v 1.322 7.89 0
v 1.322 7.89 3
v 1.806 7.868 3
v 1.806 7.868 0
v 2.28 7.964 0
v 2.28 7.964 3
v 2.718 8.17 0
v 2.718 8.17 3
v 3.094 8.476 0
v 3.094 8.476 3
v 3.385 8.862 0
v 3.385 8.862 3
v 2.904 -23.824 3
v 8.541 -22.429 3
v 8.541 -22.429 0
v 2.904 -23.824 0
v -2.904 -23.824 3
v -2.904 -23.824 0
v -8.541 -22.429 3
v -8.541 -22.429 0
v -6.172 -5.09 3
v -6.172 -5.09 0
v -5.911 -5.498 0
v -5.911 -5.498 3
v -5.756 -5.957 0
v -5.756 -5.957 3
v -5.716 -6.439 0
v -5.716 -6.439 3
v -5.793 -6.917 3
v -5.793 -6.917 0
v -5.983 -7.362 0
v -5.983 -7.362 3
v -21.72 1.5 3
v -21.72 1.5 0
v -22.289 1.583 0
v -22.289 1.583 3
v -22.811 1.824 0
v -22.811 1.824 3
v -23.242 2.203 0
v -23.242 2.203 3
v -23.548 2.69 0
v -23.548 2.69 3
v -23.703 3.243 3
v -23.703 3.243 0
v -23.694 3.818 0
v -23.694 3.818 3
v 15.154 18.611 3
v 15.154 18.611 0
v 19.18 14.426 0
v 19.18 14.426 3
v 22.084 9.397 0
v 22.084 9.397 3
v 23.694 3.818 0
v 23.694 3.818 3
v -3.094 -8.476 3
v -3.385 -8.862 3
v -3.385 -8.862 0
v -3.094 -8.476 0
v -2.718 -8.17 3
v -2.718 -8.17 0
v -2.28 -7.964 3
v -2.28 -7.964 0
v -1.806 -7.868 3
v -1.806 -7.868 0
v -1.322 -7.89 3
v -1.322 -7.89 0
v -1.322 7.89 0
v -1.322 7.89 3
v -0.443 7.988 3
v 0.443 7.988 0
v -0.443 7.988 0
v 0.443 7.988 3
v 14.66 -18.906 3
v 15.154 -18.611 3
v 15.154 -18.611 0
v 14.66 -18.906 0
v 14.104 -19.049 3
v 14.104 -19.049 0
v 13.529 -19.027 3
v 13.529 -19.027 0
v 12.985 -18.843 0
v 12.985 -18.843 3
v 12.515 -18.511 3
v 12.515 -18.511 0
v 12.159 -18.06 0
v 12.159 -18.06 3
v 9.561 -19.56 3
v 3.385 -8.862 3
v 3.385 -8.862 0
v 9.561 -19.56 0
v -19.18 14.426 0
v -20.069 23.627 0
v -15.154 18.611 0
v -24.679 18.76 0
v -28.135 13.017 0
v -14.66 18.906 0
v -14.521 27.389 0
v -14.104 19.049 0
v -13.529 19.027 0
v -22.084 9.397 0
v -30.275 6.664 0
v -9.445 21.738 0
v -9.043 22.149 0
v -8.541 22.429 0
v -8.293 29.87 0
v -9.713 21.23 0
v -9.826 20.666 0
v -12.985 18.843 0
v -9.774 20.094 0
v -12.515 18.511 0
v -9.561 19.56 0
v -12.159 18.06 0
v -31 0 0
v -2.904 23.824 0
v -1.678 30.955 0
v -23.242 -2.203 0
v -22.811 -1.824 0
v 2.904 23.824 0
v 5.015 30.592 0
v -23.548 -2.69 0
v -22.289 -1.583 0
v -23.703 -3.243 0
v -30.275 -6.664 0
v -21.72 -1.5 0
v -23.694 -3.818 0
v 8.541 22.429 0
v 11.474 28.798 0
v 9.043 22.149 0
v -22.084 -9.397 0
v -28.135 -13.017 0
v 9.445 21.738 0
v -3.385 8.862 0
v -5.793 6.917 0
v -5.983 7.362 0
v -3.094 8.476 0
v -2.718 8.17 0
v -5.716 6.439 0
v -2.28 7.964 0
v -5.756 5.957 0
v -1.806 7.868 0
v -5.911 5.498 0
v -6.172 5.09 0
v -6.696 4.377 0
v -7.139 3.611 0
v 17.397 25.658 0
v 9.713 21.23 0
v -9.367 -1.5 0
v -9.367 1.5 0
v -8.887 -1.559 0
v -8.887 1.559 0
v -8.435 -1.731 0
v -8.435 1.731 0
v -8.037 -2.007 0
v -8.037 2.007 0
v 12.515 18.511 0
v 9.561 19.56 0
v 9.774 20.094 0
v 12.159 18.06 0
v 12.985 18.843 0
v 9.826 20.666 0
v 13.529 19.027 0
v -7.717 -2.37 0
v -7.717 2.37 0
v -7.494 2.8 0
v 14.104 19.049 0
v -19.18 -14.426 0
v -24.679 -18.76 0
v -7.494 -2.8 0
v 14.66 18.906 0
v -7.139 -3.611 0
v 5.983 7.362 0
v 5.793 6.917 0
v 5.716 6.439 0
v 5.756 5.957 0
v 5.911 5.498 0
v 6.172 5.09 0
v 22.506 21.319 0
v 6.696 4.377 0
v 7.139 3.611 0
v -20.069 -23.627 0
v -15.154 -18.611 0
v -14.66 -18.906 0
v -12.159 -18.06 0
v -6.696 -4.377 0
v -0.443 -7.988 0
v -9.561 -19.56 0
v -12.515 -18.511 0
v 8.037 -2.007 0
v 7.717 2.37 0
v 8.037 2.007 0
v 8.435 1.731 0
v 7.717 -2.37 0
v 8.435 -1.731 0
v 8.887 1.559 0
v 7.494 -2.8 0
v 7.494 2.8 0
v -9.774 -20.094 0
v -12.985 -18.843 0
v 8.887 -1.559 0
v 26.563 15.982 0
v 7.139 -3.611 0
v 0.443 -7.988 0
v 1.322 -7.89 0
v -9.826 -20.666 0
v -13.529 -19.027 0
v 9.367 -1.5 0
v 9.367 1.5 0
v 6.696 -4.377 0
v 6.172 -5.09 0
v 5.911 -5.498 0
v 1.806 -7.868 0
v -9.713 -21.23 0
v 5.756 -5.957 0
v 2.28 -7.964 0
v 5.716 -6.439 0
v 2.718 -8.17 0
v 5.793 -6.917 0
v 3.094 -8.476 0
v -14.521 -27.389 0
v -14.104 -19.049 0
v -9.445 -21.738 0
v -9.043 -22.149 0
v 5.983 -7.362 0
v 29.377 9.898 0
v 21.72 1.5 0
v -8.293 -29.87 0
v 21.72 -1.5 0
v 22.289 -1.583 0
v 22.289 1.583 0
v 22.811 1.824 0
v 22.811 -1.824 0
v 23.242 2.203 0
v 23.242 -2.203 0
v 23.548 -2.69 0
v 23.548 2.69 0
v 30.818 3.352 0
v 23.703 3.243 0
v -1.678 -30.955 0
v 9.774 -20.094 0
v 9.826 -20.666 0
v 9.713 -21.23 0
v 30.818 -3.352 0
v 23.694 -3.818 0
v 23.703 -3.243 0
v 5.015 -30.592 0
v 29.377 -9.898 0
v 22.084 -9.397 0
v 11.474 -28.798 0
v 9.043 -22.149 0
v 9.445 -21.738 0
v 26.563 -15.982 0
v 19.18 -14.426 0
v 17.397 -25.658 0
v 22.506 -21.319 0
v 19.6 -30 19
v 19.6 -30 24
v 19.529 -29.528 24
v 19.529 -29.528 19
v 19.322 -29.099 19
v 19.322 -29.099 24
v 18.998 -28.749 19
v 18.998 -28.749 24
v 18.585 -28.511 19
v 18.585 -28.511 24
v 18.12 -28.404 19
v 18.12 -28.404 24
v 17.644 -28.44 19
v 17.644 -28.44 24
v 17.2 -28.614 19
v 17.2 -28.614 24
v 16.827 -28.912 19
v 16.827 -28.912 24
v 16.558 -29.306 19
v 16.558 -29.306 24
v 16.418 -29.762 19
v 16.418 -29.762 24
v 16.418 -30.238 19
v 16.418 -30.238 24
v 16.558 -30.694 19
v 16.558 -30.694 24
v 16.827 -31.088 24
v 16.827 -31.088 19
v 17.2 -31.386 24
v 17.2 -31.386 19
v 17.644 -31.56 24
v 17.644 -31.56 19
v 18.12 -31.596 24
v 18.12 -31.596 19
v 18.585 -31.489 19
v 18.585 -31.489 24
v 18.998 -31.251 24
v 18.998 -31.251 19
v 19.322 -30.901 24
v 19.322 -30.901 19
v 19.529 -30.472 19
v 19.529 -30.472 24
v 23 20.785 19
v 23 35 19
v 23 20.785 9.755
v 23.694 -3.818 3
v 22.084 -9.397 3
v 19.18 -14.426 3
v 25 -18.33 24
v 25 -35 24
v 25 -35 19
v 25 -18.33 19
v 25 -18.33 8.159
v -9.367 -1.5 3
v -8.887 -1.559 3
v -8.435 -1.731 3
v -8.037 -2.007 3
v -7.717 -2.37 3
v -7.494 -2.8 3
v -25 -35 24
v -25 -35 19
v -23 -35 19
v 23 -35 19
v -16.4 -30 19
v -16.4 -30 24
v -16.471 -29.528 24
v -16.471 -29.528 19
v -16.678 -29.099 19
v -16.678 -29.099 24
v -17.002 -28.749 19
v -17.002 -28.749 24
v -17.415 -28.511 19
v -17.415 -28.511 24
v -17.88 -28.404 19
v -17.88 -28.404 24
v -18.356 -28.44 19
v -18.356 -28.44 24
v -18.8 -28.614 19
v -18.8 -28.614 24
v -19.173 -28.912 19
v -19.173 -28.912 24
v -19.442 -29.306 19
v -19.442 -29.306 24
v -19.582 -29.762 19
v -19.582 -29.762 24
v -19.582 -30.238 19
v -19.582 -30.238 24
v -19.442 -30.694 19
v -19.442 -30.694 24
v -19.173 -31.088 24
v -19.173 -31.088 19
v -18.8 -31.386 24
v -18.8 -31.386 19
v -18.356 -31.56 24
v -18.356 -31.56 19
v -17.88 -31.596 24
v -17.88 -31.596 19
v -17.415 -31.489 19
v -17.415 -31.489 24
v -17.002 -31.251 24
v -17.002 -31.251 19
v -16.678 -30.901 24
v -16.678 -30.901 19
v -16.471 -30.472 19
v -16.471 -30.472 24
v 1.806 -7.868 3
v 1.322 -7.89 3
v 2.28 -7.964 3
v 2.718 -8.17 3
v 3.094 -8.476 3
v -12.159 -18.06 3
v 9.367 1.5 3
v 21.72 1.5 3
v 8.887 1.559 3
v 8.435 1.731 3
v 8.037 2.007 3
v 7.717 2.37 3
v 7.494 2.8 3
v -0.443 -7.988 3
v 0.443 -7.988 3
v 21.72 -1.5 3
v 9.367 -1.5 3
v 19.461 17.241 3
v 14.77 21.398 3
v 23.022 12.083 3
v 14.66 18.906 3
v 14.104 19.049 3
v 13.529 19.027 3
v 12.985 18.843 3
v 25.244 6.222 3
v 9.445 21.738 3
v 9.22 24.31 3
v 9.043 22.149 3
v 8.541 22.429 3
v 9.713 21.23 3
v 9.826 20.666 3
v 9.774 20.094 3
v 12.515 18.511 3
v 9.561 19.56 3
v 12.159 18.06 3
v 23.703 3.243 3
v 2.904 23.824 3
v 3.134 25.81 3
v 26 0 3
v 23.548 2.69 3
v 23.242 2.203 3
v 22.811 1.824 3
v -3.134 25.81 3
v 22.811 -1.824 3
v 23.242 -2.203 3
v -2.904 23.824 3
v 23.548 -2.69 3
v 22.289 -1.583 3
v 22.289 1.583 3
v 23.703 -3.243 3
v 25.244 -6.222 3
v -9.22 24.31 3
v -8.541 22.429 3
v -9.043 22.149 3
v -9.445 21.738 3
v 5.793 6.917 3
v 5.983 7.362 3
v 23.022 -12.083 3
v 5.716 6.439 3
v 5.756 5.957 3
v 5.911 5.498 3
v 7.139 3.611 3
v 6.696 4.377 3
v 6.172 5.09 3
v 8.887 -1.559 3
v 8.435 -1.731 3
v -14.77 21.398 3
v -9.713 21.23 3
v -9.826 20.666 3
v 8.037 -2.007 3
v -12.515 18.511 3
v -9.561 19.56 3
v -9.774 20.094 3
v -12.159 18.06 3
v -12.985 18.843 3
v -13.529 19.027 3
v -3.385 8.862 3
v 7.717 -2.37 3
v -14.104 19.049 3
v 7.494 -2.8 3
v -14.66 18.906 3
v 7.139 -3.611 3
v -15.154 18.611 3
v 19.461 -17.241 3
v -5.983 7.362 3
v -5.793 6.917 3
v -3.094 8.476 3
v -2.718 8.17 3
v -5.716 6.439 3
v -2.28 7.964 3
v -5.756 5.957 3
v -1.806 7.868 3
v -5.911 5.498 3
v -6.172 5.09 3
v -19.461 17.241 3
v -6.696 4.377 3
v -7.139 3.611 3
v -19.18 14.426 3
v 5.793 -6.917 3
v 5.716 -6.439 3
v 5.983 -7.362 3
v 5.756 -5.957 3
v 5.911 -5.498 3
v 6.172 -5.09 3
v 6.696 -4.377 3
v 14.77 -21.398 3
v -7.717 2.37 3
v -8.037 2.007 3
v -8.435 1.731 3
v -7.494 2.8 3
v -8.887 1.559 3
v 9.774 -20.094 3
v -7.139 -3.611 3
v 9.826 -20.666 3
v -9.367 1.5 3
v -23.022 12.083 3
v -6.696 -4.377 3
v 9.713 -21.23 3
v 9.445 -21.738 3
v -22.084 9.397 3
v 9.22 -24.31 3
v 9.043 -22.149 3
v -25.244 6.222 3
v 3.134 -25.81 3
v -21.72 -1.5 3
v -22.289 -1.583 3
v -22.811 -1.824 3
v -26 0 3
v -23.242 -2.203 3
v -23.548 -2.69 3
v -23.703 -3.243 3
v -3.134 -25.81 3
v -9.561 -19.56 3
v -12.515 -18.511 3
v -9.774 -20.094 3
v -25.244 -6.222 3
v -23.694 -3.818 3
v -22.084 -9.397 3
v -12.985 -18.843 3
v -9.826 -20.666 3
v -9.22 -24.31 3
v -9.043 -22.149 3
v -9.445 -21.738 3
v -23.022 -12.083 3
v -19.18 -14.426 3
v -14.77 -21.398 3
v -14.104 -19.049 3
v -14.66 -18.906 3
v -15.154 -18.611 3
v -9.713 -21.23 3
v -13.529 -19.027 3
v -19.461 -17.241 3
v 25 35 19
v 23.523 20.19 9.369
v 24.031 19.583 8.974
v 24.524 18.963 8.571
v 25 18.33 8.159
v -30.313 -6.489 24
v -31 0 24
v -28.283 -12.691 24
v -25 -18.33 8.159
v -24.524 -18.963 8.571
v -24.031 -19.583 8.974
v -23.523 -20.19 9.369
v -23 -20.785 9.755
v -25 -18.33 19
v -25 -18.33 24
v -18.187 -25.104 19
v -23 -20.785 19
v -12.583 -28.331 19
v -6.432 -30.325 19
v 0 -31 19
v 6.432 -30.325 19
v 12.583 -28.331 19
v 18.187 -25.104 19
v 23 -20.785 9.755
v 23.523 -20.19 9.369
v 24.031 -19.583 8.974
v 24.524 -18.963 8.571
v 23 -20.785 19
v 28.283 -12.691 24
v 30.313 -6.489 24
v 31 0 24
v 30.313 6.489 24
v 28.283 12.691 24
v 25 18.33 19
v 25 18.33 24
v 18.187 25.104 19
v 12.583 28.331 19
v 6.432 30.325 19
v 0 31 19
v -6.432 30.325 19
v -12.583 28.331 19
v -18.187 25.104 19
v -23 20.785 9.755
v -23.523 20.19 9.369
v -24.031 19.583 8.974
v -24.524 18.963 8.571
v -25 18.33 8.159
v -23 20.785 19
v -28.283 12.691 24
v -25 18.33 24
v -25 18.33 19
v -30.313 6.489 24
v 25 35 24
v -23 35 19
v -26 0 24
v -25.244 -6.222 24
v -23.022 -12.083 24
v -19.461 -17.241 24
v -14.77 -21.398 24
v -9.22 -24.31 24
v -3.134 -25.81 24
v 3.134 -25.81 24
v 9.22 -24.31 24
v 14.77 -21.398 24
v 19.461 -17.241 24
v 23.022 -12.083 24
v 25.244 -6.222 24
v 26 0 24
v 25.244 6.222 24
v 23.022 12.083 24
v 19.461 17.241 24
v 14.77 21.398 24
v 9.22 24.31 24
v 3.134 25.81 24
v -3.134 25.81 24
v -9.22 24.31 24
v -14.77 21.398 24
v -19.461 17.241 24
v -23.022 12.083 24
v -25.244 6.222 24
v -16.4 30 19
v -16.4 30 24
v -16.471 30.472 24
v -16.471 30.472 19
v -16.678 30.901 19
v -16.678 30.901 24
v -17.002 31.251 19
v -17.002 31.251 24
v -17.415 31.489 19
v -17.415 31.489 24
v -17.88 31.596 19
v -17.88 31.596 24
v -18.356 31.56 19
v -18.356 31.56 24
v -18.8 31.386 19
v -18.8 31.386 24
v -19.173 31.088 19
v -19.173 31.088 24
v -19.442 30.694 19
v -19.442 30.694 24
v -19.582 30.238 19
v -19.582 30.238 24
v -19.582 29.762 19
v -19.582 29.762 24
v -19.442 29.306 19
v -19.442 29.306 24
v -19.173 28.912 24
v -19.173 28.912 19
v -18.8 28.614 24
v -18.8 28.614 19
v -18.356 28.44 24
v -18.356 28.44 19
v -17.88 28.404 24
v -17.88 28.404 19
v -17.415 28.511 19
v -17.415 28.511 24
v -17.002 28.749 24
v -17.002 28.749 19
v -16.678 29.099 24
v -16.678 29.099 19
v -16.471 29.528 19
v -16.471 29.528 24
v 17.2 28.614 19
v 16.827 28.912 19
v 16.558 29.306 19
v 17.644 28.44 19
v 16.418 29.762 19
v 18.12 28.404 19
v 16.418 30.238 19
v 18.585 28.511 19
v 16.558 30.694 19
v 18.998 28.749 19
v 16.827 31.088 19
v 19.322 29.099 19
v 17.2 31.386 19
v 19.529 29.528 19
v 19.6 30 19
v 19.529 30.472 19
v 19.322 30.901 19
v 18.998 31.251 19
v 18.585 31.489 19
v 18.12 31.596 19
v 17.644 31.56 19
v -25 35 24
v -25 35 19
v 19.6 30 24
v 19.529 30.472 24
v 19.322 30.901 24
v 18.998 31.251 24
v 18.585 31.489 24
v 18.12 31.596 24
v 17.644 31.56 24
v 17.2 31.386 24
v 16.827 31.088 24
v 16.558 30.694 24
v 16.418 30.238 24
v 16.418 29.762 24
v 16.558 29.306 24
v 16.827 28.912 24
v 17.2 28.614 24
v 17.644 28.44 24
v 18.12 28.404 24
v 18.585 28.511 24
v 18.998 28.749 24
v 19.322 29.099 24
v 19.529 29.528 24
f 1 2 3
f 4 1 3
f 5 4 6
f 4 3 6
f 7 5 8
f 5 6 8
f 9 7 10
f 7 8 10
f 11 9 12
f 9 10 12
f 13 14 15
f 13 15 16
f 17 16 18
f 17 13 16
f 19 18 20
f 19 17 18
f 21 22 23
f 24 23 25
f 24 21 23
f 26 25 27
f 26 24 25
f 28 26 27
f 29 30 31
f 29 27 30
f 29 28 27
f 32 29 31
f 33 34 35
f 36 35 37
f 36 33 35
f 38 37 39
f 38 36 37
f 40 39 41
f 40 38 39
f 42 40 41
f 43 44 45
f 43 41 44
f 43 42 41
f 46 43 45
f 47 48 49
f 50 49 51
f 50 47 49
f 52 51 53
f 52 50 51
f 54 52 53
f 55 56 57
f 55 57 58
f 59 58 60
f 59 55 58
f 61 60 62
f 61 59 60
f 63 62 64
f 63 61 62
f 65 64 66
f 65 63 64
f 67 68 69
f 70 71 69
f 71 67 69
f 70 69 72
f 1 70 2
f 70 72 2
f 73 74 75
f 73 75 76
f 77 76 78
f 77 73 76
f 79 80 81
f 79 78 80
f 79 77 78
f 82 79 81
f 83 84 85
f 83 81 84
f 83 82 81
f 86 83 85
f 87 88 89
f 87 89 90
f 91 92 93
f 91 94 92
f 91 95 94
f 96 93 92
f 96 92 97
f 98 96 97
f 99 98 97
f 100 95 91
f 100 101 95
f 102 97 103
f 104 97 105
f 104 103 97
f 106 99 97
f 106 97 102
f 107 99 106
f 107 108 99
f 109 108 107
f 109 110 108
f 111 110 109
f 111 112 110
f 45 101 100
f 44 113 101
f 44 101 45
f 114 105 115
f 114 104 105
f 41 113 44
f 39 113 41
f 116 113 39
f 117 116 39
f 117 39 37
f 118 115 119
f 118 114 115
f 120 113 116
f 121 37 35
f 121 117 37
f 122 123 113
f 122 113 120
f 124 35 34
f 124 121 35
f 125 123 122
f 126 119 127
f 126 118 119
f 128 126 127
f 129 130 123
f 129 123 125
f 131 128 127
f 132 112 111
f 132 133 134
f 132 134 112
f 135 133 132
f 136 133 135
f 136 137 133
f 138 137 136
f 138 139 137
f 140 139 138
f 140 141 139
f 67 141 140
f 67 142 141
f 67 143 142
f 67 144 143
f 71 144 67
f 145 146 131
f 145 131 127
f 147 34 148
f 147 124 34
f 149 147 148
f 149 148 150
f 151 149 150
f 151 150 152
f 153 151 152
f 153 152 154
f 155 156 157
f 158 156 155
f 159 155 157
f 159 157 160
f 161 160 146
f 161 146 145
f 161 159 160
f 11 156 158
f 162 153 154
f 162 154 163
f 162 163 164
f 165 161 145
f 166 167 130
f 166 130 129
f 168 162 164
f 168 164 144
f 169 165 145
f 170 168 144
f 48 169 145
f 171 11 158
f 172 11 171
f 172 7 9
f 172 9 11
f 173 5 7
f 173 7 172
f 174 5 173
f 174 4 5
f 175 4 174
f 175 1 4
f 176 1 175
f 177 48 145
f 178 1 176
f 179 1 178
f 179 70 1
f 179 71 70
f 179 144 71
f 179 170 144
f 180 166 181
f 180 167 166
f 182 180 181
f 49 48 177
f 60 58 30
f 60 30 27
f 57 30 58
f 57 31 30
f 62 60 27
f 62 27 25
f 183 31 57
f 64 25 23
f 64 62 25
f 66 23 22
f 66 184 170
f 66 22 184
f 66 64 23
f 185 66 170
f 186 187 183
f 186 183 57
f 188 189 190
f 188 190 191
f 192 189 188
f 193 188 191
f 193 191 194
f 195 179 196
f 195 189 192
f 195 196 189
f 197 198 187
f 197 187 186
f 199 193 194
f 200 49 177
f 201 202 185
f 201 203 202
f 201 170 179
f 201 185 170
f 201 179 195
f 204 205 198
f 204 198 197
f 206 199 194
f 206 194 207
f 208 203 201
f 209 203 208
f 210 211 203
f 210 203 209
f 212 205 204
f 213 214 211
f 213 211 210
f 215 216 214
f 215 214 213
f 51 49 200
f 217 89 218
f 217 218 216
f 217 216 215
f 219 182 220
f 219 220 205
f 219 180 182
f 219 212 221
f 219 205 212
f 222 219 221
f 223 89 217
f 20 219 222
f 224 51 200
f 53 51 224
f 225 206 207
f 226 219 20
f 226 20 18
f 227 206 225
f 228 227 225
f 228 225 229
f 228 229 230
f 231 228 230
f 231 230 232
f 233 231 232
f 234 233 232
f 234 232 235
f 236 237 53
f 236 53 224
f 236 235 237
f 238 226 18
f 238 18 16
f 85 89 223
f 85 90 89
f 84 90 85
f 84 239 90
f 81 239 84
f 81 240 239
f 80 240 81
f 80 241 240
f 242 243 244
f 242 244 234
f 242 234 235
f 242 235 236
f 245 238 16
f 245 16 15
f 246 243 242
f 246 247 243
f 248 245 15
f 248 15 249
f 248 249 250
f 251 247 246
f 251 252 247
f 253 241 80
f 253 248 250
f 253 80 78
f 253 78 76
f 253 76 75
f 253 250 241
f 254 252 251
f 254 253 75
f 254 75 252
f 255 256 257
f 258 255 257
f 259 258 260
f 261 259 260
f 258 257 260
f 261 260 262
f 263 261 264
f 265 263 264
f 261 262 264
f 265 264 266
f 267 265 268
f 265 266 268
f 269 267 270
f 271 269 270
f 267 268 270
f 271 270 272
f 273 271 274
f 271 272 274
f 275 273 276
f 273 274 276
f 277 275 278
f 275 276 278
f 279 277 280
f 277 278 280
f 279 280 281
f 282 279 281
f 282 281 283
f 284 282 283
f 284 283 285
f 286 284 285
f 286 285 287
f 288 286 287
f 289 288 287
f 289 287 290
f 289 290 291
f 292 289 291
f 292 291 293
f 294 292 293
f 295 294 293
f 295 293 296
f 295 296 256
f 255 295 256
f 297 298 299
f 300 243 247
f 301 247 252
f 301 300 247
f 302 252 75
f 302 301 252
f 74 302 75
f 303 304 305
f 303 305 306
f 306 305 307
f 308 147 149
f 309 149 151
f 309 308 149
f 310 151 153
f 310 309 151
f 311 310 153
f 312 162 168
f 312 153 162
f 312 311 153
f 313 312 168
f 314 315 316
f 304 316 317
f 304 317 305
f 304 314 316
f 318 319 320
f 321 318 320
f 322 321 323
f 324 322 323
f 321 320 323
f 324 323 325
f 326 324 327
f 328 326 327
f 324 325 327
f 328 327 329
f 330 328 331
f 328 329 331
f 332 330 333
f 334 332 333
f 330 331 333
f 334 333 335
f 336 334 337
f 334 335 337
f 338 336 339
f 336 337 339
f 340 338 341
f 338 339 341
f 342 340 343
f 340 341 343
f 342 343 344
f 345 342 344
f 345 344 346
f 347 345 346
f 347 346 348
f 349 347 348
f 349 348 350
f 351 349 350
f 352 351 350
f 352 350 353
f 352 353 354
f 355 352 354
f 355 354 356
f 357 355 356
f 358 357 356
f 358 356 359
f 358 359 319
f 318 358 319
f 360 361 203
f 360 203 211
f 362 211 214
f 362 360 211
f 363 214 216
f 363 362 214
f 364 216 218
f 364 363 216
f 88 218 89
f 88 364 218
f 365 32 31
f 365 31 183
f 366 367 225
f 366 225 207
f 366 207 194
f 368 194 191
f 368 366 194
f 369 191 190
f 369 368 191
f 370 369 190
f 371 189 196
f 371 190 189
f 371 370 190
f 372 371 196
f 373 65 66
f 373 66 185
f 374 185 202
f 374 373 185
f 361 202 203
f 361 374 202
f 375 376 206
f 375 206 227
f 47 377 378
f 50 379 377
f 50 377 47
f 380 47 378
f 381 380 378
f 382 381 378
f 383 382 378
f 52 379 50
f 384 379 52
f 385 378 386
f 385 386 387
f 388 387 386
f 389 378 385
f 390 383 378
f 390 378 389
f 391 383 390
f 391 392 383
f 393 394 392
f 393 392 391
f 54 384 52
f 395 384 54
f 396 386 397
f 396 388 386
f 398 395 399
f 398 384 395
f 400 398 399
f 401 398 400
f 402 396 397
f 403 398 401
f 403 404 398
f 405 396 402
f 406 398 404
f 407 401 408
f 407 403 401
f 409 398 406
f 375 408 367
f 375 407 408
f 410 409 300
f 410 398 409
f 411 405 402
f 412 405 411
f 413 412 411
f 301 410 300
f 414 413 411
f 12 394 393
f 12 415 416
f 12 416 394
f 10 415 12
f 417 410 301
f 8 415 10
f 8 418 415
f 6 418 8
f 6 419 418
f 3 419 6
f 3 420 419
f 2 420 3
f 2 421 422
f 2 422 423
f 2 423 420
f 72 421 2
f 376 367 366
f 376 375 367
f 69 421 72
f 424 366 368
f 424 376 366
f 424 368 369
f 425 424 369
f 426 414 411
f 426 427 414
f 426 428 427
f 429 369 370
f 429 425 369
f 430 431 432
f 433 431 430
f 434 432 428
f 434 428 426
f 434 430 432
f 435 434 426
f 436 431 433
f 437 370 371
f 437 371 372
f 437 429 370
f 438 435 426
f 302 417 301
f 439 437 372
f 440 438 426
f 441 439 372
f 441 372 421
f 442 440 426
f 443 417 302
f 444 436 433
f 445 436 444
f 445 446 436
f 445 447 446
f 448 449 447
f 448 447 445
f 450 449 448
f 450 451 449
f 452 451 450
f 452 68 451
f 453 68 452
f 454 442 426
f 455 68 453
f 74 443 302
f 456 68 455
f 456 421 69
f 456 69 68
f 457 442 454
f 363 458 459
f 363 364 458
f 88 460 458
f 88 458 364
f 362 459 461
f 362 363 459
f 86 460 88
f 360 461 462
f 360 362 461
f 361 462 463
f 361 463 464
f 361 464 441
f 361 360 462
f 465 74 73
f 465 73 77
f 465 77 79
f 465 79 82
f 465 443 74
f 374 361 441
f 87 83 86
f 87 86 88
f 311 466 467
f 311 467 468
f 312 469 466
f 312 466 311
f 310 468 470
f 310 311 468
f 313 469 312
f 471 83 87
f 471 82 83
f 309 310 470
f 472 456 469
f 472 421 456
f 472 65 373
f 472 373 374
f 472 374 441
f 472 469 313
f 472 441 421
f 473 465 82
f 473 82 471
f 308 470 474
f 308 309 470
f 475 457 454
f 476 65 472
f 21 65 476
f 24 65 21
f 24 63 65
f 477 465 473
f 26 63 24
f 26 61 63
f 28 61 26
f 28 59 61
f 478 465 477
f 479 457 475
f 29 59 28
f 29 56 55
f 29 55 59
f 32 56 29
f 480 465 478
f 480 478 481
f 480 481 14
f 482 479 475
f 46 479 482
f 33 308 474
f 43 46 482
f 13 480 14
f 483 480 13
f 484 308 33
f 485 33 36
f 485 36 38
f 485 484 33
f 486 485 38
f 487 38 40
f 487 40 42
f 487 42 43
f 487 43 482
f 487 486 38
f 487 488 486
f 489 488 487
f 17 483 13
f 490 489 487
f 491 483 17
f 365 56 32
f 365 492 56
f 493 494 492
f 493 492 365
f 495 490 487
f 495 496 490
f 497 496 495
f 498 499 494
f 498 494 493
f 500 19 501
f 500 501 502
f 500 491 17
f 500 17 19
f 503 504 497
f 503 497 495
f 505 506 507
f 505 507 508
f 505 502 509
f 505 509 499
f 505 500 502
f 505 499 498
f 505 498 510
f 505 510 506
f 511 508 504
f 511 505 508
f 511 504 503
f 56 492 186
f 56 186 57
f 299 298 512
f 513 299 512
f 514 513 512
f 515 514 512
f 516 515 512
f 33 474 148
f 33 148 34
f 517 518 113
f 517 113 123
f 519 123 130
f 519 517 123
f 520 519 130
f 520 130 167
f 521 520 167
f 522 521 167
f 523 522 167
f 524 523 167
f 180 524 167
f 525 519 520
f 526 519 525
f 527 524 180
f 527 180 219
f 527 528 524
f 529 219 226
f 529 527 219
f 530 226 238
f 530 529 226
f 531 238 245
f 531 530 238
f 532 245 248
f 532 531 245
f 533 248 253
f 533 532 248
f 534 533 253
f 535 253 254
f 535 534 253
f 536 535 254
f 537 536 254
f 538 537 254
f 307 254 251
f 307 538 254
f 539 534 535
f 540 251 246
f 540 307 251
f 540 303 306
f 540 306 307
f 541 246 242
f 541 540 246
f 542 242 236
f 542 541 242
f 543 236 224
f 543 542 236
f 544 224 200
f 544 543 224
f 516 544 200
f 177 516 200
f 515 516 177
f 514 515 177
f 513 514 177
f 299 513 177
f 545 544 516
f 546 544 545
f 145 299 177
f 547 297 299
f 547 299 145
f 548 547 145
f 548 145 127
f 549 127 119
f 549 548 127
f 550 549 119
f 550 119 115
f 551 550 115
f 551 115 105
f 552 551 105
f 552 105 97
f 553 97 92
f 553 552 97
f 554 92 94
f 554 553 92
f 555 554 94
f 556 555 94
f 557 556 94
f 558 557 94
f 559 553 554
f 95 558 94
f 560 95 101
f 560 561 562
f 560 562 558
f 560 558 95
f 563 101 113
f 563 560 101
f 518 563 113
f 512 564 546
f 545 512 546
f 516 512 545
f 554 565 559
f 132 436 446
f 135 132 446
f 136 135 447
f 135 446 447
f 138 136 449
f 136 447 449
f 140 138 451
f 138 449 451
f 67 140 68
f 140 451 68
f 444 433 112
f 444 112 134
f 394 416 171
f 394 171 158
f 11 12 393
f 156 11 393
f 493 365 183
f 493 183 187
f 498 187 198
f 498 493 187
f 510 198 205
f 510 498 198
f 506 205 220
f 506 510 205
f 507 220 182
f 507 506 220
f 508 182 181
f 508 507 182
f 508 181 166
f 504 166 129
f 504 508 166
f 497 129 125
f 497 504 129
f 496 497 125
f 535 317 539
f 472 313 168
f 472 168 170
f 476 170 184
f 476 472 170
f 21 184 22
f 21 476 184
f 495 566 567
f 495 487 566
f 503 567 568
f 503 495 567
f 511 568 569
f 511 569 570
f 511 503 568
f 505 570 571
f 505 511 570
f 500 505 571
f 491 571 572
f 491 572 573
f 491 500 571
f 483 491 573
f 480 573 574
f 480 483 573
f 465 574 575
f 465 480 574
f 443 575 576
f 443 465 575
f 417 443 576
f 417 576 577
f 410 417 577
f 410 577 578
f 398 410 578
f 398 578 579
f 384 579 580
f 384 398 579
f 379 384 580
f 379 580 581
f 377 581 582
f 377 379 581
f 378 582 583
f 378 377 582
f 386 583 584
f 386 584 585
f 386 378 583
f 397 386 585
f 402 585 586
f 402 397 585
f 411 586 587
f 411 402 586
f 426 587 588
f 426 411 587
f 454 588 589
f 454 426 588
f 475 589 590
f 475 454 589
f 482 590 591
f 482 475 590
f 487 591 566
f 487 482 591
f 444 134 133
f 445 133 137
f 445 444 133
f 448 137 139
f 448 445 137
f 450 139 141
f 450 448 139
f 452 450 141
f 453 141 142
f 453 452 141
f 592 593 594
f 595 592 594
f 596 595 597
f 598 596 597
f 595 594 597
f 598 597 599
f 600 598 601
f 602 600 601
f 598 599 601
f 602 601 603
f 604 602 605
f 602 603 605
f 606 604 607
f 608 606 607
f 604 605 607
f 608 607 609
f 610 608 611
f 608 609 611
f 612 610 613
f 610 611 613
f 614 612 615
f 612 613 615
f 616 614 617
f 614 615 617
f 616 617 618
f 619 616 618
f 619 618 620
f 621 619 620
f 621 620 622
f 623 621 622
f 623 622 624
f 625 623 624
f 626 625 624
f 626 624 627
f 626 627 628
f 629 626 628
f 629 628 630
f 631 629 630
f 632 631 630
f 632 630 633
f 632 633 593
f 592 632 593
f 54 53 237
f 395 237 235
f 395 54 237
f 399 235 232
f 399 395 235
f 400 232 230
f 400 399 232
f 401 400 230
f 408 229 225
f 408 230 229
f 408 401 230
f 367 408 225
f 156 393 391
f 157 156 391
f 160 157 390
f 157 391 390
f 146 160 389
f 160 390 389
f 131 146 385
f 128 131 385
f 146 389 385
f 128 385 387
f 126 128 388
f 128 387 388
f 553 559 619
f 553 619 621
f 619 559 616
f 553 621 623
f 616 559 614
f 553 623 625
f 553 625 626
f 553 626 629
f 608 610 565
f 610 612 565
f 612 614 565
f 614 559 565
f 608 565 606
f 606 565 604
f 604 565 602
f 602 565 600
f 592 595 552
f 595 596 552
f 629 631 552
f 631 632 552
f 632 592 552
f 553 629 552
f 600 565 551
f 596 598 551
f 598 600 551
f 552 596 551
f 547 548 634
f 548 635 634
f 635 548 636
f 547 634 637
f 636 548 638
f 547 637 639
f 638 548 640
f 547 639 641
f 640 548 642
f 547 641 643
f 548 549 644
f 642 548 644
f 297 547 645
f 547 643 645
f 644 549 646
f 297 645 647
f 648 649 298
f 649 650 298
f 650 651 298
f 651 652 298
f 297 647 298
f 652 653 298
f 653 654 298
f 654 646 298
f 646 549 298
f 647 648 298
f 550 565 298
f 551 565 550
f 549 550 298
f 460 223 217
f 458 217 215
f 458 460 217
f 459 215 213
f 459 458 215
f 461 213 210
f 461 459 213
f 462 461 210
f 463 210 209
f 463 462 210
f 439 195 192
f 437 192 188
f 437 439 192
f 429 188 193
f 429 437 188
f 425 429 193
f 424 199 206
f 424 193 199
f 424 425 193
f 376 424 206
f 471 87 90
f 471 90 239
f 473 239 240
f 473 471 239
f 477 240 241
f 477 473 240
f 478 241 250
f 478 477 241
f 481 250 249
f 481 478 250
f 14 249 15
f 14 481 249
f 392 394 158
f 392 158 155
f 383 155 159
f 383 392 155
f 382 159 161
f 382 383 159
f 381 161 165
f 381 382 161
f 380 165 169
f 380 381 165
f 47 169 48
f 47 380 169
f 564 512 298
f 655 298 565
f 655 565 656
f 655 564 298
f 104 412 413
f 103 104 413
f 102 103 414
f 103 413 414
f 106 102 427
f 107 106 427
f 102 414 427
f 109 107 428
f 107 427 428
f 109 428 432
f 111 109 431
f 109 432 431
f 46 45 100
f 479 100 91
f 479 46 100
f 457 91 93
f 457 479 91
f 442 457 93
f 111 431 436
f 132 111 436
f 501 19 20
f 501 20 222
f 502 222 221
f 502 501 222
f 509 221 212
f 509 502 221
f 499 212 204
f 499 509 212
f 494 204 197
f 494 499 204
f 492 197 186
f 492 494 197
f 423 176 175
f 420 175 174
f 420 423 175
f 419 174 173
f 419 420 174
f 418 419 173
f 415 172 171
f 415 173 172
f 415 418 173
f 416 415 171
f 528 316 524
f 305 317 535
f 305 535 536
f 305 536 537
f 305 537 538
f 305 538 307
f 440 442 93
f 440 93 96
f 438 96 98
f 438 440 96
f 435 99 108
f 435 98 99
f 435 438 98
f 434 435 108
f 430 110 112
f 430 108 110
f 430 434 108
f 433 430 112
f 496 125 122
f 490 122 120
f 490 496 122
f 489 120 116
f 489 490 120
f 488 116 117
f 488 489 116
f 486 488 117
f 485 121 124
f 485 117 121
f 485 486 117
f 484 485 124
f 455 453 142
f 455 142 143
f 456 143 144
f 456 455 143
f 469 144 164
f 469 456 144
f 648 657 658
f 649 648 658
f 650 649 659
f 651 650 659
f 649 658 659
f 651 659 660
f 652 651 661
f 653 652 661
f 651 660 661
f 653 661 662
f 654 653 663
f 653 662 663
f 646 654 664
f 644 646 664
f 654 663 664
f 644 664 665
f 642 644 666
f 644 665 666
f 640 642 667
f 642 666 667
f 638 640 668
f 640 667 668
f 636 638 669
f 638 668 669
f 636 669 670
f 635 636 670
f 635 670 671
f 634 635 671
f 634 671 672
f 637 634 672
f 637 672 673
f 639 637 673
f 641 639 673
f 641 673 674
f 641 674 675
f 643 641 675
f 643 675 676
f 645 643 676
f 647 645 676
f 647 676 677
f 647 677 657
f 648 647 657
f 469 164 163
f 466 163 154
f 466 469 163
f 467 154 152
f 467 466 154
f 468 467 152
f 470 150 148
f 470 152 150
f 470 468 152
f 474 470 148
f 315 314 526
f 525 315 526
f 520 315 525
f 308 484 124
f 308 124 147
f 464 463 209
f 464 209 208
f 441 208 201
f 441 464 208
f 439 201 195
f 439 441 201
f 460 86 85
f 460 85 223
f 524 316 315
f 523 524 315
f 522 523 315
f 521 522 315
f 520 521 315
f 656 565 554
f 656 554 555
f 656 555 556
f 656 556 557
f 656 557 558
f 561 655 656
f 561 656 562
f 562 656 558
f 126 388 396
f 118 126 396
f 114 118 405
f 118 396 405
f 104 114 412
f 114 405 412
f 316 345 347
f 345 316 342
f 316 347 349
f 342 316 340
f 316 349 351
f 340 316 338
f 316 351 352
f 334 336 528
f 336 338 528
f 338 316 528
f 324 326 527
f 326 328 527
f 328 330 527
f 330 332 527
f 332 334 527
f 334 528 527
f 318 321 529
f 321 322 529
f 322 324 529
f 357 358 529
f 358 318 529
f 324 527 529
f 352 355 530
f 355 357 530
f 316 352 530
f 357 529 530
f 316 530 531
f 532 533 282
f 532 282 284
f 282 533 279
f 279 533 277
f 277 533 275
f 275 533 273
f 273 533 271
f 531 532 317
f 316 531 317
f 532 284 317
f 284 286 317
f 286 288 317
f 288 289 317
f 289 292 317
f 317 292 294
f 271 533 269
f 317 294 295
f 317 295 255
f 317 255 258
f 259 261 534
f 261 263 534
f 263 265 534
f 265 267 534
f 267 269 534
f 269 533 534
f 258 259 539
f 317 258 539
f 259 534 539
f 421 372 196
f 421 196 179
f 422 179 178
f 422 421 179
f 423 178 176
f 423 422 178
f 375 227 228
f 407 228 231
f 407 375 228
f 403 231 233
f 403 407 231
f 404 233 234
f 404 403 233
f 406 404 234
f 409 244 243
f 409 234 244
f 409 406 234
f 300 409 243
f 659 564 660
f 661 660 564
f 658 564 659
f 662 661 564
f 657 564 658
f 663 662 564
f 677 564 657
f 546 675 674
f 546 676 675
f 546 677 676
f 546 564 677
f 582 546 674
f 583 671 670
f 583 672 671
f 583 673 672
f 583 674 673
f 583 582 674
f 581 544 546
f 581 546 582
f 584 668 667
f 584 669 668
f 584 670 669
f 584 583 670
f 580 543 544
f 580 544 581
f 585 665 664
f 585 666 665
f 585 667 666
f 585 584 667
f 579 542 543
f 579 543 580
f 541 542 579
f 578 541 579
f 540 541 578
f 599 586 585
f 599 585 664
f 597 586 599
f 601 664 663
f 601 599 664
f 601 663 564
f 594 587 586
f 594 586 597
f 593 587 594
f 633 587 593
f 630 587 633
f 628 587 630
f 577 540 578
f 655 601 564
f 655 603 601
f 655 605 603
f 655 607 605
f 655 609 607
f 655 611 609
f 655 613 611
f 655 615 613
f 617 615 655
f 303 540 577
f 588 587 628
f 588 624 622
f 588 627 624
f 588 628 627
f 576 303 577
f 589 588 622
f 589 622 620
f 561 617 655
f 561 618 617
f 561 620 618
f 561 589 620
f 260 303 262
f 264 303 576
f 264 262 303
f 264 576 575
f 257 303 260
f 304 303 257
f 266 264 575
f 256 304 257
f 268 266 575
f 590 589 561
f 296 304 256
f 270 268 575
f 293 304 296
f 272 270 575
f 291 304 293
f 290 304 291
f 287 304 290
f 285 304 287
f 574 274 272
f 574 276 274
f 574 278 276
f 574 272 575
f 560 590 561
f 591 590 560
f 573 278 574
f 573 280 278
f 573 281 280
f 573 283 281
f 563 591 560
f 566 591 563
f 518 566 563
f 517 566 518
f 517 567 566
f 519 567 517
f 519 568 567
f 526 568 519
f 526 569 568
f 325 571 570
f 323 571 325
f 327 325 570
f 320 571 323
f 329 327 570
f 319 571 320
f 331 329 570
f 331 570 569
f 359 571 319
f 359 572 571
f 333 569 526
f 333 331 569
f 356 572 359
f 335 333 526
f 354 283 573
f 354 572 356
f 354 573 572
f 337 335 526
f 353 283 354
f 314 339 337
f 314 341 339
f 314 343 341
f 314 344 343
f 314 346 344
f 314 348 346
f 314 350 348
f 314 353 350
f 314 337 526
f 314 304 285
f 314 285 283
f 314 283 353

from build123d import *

# Parameters (mm, degrees)
BOSS_EXTRUDE1_DEPTH     = 5
RIB4_REACH              = 72.264
SKETCH3_WALL_W          = 162.412301062
SKETCH3_WALL_H          = 2
MIRROR2_COPY_1_REACH    = 72.264
MIRROR2_COPY_1_SKETCH_W = 162.412301062
MIRROR2_COPY_1_SKETCH_H = 2
CUT_EXTRUDE1_DEPTH      = 52.254268115
SKETCH5_R               = 1.6
CUT_EXTRUDE2_DEPTH      = 53.554733374


with BuildPart() as part:
    # Sketch1 → Revolve1 (revolve)
    with BuildSketch(Plane(origin=(0, 0, 0), x_dir=(0, 0, -1), z_dir=(1, 0, 0)), mode=Mode.PRIVATE) as revolve1_sk:
        Polygon((0, 0), (0, 31), (-24, 31), (-24, 26), (-3, 26), (-3, 0), align=None)
    revolve(revolve1_sk.sketch.rotate(Axis((0, 0, 0), (0, 0, 1)), 90), axis=Axis((0, 0, 0), (0, 0, 1)))

    # Sketch2 → Boss-Extrude1 (add)
    with BuildSketch(Plane.XY.offset(24)):
        with BuildLine():
            Line((25, 35), (-25, 35))
            Line((-25, 35), (-25, 18.33030278))
            ThreePointArc((-25, 18.33030278), (0, 31), (25, 18.33030278))
            Line((25, 18.33030278), (25, 35))
        make_face()
        with BuildLine():
            Line((25, -35), (25, -18.33030278))
            ThreePointArc((25, -18.33030278), (0, -31), (-25, -18.33030278))
            Line((-25, -18.33030278), (-25, -35))
            Line((-25, -35), (25, -35))
        make_face()
    extrude(amount=-BOSS_EXTRUDE1_DEPTH)

    # Sketch3 wall → Rib4 (add, up to next)
    with BuildSketch(Plane(origin=(25, 26.66515139, 13.579588783), x_dir=(0, -0.838316763898, -0.54518345845), z_dir=(0, 0.54518345845, -0.838316763898)), mode=Mode.PRIVATE) as rib4_sk1:
        with Locations((0, 1)):
            Rectangle(SKETCH3_WALL_W, SKETCH3_WALL_H)
    rib4_tool1 = extrude(rib4_sk1.sketch, amount=-RIB4_REACH, mode=Mode.PRIVATE) - part.part
    rib4 = rib4_tool1.solids().sort_by_distance((25, 26.66515139, 13.579588783))[0]
    add(rib4)

    # Mirror1: Rib4 across plane
    add(rib4.mirror(Plane.ZX))

    # Mirror2: Rib4 across plane
    add(rib4.mirror(Plane(origin=(0, 0, 0), x_dir=(0, 0, 1), z_dir=(1, 0, 0))))

    # Mirror2 copy 1 sketch → Mirror2 copy 1 (add, up to next)
    with BuildSketch(Plane(origin=(-25, -26.66515139, 13.579588783), x_dir=(0, 0.838316763898, -0.54518345845), z_dir=(0, -0.54518345845, -0.838316763898)), mode=Mode.PRIVATE) as mirror2_copy_1_sk1:
        with Locations((0, 1)):
            Rectangle(MIRROR2_COPY_1_SKETCH_W, MIRROR2_COPY_1_SKETCH_H)
    mirror2_copy_1_tool1 = extrude(mirror2_copy_1_sk1.sketch, amount=-MIRROR2_COPY_1_REACH, mode=Mode.PRIVATE) - part.part
    add(mirror2_copy_1_tool1.solids().sort_by_distance((-25, -26.66515139, 13.579588783))[0])

    # Sketch4 → Cut-Extrude1 (cut, through all)
    with BuildSketch(Plane.XY.offset(3)):
        with BuildLine():
            Line((-9.560865209, 19.559904306), (-3.384710393, 8.86249037))
            ThreePointArc((-3.384710393, 8.86249037), (-2.50559682, 8.053485651), (-1.322127668, 7.889992296))
            ThreePointArc((-1.322127668, 7.889992296), (0, 8), (1.322127668, 7.889992296))
            ThreePointArc((1.322127668, 7.889992296), (2.50559682, 8.053485651), (3.384710393, 8.86249037))
            Line((3.384710393, 8.86249037), (9.560865209, 19.559904306))
            ThreePointArc((9.560865209, 19.559904306), (9.713197693, 21.230053251), (8.540524801, 22.428986516))
            ThreePointArc((8.540524801, 22.428986516), (0, 24), (-8.540524801, 22.428986516))
            ThreePointArc((-8.540524801, 22.428986516), (-9.713197693, 21.230053251), (-9.560865209, 19.559904306))
        make_face()
        with BuildLine():
            Line((21.719806629, 1.5), (9.367496998, 1.5))
            ThreePointArc((9.367496998, 1.5), (8.227321572, 1.856832327), (7.493997598, 2.8))
            ThreePointArc((7.493997598, 2.8), (6.92820323, 4), (6.17186993, 5.089992296))
            ThreePointArc((6.17186993, 5.089992296), (5.721724752, 6.196653323), (5.982786604, 7.36249037))
            Line((5.982786604, 7.36249037), (12.15894142, 18.059904306))
            ThreePointArc((12.15894142, 18.059904306), (13.529166592, 19.02690258), (15.153809703, 18.610804697))
            ThreePointArc((15.153809703, 18.610804697), (20.784609691, 12), (23.694334504, 3.818181818))
            ThreePointArc((23.694334504, 3.818181818), (23.242364286, 2.203150671), (21.719806629, 1.5))
        make_face()
        with BuildLine():
            Line((12.15894142, -18.059904306), (5.982786604, -7.36249037))
            ThreePointArc((5.982786604, -7.36249037), (5.721724752, -6.196653323), (6.17186993, -5.089992296))
            ThreePointArc((6.17186993, -5.089992296), (6.92820323, -4), (7.493997598, -2.8))
            ThreePointArc((7.493997598, -2.8), (8.227321572, -1.856832327), (9.367496998, -1.5))
            Line((9.367496998, -1.5), (21.719806629, -1.5))
            ThreePointArc((21.719806629, -1.5), (23.242364286, -2.203150671), (23.694334504, -3.818181818))
            ThreePointArc((23.694334504, -3.818181818), (20.784609691, -12), (15.153809703, -18.610804697))
            ThreePointArc((15.153809703, -18.610804697), (13.529166592, -19.02690258), (12.15894142, -18.059904306))
        make_face()
        with BuildLine():
            Line((-9.560865209, -19.559904306), (-3.384710393, -8.86249037))
            ThreePointArc((-3.384710393, -8.86249037), (-2.50559682, -8.053485651), (-1.322127668, -7.889992296))
            ThreePointArc((-1.322127668, -7.889992296), (0, -8), (1.322127668, -7.889992296))
            ThreePointArc((1.322127668, -7.889992296), (2.50559682, -8.053485651), (3.384710393, -8.86249037))
            Line((3.384710393, -8.86249037), (9.560865209, -19.559904306))
            ThreePointArc((9.560865209, -19.559904306), (9.713197693, -21.230053251), (8.540524801, -22.428986516))
            ThreePointArc((8.540524801, -22.428986516), (0, -24), (-8.540524801, -22.428986516))
            ThreePointArc((-8.540524801, -22.428986516), (-9.713197693, -21.230053251), (-9.560865209, -19.559904306))
        make_face()
        with BuildLine():
            Line((-21.719806629, -1.5), (-9.367496998, -1.5))
            ThreePointArc((-9.367496998, -1.5), (-8.227321572, -1.856832327), (-7.493997598, -2.8))
            ThreePointArc((-7.493997598, -2.8), (-6.92820323, -4), (-6.17186993, -5.089992296))
            ThreePointArc((-6.17186993, -5.089992296), (-5.721724752, -6.196653323), (-5.982786604, -7.36249037))
            Line((-5.982786604, -7.36249037), (-12.15894142, -18.059904306))
            ThreePointArc((-12.15894142, -18.059904306), (-13.529166592, -19.02690258), (-15.153809703, -18.610804697))
            ThreePointArc((-15.153809703, -18.610804697), (-20.784609691, -12), (-23.694334504, -3.818181818))
            ThreePointArc((-23.694334504, -3.818181818), (-23.242364286, -2.203150671), (-21.719806629, -1.5))
        make_face()
        with BuildLine():
            Line((-12.15894142, 18.059904306), (-5.982786604, 7.36249037))
            ThreePointArc((-5.982786604, 7.36249037), (-5.721724752, 6.196653323), (-6.17186993, 5.089992296))
            ThreePointArc((-6.17186993, 5.089992296), (-6.92820323, 4), (-7.493997598, 2.8))
            ThreePointArc((-7.493997598, 2.8), (-8.227321572, 1.856832327), (-9.367496998, 1.5))
            Line((-9.367496998, 1.5), (-21.719806629, 1.5))
            ThreePointArc((-21.719806629, 1.5), (-23.242364286, 2.203150671), (-23.694334504, 3.818181818))
            ThreePointArc((-23.694334504, 3.818181818), (-20.784609691, 12), (-15.153809703, 18.610804697))
            ThreePointArc((-15.153809703, 18.610804697), (-13.529166592, 19.02690258), (-12.15894142, 18.059904306))
        make_face()
    extrude(amount=-CUT_EXTRUDE1_DEPTH, mode=Mode.SUBTRACT)

    # Sketch5 → Cut-Extrude2 (cut, through all)
    with BuildSketch(Plane.XY.offset(24)):
        with Locations((-18, 30)):
            Circle(SKETCH5_R)
        with Locations((18, 30)):
            Circle(SKETCH5_R)
        with Locations((18, -30)):
            Circle(SKETCH5_R)
        with Locations((-18, -30)):
            Circle(SKETCH5_R)
    extrude(amount=-CUT_EXTRUDE2_DEPTH, mode=Mode.SUBTRACT)


solid = part.part
